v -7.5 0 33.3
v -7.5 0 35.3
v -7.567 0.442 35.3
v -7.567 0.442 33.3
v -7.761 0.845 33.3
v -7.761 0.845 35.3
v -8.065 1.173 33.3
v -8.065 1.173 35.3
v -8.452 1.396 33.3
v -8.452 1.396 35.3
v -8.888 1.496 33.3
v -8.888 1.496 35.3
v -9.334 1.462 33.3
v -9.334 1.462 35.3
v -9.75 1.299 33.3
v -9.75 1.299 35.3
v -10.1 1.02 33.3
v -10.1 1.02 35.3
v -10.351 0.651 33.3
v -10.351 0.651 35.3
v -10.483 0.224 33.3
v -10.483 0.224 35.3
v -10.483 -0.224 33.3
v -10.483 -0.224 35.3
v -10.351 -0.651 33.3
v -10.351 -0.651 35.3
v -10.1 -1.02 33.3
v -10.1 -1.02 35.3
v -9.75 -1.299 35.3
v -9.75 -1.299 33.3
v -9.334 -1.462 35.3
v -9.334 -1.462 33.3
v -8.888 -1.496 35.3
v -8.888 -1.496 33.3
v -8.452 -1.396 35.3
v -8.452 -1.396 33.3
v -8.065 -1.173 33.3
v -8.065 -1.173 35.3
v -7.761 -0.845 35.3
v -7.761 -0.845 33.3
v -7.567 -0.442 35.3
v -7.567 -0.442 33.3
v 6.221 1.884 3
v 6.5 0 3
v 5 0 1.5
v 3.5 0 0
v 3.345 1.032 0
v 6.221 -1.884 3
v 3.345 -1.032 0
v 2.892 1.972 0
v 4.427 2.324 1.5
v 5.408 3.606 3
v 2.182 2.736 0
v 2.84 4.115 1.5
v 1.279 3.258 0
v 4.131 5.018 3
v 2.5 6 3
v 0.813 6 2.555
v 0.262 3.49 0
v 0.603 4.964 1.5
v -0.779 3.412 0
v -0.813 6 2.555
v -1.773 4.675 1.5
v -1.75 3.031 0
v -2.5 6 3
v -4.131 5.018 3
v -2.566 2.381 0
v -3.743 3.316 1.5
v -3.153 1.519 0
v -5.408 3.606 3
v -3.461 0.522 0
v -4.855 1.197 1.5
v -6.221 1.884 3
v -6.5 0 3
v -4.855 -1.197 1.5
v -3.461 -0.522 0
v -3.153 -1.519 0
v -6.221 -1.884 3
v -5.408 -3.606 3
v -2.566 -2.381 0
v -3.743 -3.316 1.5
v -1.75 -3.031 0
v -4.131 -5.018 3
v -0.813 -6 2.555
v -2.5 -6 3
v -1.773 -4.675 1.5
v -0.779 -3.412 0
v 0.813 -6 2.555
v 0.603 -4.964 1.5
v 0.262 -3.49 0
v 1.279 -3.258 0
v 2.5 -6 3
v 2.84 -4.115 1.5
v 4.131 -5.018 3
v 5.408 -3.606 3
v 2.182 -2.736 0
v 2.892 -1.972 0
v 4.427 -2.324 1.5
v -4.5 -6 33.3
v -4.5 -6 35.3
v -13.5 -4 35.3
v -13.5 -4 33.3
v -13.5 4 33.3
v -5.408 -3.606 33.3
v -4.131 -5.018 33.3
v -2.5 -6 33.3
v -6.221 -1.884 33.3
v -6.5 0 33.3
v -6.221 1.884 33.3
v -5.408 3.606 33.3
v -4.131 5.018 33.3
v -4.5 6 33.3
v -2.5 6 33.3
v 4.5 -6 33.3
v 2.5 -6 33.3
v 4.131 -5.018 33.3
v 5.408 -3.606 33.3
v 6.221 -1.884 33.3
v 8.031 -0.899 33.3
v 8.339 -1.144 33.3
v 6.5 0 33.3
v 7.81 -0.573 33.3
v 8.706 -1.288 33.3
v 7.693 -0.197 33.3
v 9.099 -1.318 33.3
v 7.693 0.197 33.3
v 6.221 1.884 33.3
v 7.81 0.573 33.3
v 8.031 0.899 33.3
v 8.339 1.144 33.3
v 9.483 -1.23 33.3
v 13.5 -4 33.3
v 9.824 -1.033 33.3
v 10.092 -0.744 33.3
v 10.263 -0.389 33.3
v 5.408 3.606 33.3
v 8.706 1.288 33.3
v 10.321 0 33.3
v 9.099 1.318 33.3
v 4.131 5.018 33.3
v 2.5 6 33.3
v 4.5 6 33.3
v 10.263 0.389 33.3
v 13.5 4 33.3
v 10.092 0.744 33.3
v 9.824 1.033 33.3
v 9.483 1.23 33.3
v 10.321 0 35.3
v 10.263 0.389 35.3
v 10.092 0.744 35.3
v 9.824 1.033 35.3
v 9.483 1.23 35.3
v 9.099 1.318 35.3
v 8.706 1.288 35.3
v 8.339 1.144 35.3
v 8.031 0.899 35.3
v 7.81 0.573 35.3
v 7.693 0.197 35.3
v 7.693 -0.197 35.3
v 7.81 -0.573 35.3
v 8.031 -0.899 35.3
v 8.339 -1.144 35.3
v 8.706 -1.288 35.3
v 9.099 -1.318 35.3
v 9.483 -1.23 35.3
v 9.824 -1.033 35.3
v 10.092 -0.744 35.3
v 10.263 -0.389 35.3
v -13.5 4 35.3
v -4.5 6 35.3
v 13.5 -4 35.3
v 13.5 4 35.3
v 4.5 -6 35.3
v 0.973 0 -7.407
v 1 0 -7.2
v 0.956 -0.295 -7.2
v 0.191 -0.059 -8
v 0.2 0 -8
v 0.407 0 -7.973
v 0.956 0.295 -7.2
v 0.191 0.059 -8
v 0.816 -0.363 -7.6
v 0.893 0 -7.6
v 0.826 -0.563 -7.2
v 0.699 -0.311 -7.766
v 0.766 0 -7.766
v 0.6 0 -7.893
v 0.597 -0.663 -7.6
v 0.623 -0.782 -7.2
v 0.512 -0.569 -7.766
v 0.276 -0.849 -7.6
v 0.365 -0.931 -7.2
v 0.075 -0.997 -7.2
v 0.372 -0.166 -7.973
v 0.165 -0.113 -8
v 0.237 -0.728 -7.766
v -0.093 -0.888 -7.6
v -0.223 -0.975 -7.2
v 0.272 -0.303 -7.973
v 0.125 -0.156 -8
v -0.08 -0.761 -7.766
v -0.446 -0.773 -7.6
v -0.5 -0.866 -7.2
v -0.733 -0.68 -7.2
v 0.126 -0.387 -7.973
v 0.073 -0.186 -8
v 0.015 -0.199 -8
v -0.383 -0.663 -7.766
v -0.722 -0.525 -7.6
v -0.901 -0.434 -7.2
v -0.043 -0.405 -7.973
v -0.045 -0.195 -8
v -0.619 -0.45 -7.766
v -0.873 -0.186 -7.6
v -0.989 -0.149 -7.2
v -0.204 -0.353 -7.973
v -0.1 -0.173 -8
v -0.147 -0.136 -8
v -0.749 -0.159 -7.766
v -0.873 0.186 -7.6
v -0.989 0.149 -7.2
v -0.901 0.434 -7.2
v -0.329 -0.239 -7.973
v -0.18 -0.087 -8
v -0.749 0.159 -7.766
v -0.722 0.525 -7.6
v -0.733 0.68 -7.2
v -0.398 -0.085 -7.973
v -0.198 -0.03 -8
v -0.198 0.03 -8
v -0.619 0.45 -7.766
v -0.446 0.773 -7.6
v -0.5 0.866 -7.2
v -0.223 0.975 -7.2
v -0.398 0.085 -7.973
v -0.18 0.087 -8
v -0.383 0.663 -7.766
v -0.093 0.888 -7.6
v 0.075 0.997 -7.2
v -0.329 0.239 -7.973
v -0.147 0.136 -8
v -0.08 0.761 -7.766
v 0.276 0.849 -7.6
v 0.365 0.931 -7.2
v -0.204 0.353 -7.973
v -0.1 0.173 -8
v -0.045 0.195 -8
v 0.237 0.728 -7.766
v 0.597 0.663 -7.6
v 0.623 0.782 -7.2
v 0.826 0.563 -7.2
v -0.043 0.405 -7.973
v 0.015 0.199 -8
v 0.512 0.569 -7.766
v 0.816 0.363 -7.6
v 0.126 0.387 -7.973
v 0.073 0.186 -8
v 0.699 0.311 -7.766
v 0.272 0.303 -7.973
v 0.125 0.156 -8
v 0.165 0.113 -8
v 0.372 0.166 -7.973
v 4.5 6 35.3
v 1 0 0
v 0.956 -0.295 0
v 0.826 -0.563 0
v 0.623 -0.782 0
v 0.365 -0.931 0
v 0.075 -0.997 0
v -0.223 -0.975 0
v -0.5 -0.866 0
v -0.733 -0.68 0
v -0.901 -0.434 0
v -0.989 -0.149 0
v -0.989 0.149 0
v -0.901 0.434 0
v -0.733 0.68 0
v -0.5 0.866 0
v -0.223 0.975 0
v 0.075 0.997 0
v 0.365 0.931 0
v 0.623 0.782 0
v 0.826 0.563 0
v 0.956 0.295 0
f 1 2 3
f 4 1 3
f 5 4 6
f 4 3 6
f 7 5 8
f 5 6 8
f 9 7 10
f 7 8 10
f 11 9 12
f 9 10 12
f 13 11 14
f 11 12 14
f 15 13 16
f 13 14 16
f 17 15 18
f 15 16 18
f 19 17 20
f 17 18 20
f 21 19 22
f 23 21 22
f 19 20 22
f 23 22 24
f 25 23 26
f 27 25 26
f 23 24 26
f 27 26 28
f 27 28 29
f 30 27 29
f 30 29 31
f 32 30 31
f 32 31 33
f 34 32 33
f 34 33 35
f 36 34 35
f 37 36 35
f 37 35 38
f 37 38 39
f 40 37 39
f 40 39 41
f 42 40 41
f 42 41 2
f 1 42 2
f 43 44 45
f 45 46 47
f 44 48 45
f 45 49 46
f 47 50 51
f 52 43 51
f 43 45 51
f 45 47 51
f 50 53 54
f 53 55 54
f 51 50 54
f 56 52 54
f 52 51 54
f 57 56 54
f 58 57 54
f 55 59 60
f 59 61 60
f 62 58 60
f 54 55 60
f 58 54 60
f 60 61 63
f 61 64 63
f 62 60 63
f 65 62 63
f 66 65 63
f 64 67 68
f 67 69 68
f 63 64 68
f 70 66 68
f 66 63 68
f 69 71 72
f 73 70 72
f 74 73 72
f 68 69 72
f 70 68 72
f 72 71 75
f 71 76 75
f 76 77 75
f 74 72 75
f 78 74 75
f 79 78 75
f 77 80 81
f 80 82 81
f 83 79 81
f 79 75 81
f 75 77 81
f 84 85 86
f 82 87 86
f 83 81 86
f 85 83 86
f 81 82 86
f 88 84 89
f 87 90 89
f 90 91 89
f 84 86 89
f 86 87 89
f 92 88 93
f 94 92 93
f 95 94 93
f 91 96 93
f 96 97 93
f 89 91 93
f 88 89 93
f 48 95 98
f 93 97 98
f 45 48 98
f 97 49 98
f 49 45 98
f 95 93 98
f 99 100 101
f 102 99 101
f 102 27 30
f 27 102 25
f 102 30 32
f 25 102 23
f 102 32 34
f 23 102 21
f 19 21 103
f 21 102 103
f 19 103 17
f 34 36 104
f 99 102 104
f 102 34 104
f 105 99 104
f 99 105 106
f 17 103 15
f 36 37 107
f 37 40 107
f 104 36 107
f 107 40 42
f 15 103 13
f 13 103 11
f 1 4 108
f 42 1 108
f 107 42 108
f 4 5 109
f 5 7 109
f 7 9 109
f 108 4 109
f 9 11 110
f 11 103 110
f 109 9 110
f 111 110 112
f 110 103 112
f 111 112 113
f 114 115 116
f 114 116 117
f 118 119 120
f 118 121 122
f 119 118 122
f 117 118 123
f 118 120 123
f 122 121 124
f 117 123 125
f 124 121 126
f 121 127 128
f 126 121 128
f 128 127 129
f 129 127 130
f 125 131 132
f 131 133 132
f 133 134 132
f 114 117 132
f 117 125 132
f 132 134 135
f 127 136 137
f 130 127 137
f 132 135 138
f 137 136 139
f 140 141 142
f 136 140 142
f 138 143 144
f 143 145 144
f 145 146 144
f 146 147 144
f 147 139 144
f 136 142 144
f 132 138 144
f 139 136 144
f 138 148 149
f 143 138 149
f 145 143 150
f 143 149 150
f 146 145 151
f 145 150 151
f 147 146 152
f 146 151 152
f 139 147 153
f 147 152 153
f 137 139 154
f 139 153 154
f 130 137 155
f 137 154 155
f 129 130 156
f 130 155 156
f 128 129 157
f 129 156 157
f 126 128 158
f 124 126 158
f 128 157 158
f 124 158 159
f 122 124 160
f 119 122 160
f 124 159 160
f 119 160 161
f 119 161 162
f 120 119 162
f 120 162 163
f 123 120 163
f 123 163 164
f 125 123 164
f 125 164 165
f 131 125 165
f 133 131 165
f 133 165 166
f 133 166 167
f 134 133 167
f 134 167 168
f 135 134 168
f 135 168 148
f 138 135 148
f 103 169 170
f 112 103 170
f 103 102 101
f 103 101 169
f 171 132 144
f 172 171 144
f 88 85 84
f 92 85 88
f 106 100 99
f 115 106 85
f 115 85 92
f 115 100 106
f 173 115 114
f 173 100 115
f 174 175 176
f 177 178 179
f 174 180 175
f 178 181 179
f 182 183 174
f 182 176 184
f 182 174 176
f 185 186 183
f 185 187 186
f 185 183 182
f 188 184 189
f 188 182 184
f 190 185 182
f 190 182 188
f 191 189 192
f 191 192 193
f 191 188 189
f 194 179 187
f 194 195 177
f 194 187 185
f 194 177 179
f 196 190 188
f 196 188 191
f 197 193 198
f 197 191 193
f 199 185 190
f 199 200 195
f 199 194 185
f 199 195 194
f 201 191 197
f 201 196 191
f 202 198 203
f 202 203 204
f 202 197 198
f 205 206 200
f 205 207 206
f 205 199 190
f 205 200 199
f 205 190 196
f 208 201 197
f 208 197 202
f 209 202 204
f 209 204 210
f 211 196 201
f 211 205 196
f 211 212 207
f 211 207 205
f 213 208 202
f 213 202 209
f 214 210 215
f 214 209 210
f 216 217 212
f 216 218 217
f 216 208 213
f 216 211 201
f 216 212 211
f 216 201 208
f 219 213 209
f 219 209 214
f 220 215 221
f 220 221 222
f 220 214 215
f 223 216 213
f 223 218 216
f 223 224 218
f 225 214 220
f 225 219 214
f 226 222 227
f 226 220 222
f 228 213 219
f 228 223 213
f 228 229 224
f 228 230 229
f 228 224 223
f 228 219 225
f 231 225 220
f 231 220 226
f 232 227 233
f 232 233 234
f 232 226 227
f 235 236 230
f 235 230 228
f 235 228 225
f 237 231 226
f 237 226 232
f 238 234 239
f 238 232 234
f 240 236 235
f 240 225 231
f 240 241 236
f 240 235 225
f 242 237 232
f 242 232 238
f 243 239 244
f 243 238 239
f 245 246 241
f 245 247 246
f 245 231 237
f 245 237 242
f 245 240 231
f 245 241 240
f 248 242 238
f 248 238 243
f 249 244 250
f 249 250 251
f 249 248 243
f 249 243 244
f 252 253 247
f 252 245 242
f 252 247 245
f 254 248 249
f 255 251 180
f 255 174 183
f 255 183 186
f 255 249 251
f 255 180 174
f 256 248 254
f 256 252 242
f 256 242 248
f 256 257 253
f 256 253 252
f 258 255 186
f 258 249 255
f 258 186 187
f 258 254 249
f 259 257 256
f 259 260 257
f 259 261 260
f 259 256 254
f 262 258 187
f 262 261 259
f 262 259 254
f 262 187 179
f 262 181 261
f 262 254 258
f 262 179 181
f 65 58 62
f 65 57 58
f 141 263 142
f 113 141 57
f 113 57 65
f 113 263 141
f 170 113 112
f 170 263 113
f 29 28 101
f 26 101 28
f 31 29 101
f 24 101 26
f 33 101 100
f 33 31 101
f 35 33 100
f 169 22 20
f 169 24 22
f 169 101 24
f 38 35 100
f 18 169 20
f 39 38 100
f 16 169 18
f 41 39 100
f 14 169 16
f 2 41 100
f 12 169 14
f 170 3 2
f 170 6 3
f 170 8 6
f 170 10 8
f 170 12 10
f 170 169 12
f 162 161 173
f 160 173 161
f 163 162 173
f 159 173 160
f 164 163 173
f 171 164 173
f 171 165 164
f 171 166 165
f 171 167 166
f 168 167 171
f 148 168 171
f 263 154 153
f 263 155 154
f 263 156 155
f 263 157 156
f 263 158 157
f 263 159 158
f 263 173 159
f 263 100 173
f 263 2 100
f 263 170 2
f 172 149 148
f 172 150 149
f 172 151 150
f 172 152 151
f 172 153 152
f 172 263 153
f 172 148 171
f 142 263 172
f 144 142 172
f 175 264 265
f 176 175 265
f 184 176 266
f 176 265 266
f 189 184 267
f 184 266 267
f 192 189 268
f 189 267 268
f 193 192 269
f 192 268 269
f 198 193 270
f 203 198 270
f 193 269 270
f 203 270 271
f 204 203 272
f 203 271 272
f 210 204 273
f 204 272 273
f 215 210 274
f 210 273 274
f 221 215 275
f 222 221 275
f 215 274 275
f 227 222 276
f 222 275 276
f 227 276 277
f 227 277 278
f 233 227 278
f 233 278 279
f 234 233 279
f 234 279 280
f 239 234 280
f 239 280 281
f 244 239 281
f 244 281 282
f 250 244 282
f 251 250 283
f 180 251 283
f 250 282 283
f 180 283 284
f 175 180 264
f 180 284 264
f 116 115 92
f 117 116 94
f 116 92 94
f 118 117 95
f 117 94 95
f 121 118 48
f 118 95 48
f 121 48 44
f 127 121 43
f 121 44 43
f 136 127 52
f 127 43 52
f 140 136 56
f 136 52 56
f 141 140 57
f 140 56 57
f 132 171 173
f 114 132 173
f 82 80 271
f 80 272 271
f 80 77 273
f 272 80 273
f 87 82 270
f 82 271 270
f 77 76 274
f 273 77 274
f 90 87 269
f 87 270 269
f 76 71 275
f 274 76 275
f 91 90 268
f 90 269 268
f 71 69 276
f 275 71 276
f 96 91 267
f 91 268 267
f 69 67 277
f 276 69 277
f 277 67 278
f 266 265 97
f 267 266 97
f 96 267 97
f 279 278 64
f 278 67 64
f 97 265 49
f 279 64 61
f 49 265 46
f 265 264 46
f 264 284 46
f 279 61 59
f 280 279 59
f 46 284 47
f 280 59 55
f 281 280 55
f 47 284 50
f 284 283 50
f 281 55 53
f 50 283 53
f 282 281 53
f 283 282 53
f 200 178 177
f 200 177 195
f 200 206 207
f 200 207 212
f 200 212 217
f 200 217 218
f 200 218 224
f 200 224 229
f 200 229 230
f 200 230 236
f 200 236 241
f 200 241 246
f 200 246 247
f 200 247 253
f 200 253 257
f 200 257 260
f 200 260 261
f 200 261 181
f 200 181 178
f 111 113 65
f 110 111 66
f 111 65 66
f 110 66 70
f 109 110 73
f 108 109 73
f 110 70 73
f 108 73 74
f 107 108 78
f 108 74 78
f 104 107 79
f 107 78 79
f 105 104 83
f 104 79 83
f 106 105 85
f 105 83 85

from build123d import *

# Parameters (mm, degrees)
F0_R      = 6.5
F1_DEPTH  = 33.3
F2_SIZE   = 3
F3_W      = 27
F3_H      = 12
F4_DEPTH  = 2
F5_R      = 1
F6_DEPTH  = 8
F7_R      = 0.8
F8_R      = 1.5
F8_R_2    = 1.3212801888
F9_DEPTH  = 25
F11_DEPTH = 2
F12_W     = 9
F12_H     = 44.6074357137
F13_DEPTH = 5
F14_W     = 9
F14_H     = 35.2907052629
F15_DEPTH = 5


with BuildPart() as f1:
    # F0 (on Top) → F1 (new body)
    with BuildSketch(Plane.XY):
        Circle(F0_R)
    extrude(amount=F1_DEPTH)

    # F2
    f2_edges = [f1.edges().sort_by_distance(p)[0] for p in [
        (-6.5, 0, 0),
    ]]
    chamfer(f2_edges, length=F2_SIZE)

    # F3 (on face) → F4 (join)
    with BuildSketch(Plane.XY.offset(33.3)):
        Rectangle(F3_W, F3_H)
    extrude(amount=F4_DEPTH)

    # F5 (on face) → F6 (join)
    with BuildSketch(Plane(origin=(0, 0, 0), x_dir=(1, 0, 0), z_dir=(0, 0, -1))):
        Circle(F5_R)
    extrude(amount=F6_DEPTH)

    # F7
    f7_edges = [f1.edges().sort_by_distance(p)[0] for p in [
        (-1, 0, -8),
    ]]
    fillet(f7_edges, radius=F7_R)

    # F8 (on face) → F9 (cut)
    with BuildSketch(Plane.XY.offset(35.3)):
        with Locations((-9, 0)):
            Circle(F8_R)
        with Locations((9, 0)):
            Circle(F8_R_2)
    extrude(amount=-F9_DEPTH, mode=Mode.SUBTRACT)

    # F10 (on face) → F11 (cut, through all)
    with BuildSketch(Plane.XY.offset(35.3)):
        Polygon((-13.5, -4), (-13.5, -6), (-4.5, -6), align=None)
        Polygon((-4.5, 6), (-13.5, 6), (-13.5, 4), align=None)
        Polygon((13.5, -4), (4.5, -6), (13.5, -6), align=None)
        Polygon((13.5, 4), (13.5, 6), (4.5, 6), align=None)
    extrude(amount=-F11_DEPTH, mode=Mode.SUBTRACT)

    # F12 (on face) → F13 (cut)
    with BuildSketch(Plane.XZ.offset(6)):
        with Locations((0, 12.9962821431)):
            Rectangle(F12_W, F12_H)
    extrude(amount=F13_DEPTH, mode=Mode.SUBTRACT)

    # F14 (on face) → F15 (cut)
    with BuildSketch(Plane(origin=(0, 6, 0), x_dir=(-1, 0, 0), z_dir=(0, 1, 0))):
        with Locations((0, 15.6546473686)):
            Rectangle(F14_W, F14_H)
    extrude(amount=F15_DEPTH, mode=Mode.SUBTRACT)


solid = f1.part
